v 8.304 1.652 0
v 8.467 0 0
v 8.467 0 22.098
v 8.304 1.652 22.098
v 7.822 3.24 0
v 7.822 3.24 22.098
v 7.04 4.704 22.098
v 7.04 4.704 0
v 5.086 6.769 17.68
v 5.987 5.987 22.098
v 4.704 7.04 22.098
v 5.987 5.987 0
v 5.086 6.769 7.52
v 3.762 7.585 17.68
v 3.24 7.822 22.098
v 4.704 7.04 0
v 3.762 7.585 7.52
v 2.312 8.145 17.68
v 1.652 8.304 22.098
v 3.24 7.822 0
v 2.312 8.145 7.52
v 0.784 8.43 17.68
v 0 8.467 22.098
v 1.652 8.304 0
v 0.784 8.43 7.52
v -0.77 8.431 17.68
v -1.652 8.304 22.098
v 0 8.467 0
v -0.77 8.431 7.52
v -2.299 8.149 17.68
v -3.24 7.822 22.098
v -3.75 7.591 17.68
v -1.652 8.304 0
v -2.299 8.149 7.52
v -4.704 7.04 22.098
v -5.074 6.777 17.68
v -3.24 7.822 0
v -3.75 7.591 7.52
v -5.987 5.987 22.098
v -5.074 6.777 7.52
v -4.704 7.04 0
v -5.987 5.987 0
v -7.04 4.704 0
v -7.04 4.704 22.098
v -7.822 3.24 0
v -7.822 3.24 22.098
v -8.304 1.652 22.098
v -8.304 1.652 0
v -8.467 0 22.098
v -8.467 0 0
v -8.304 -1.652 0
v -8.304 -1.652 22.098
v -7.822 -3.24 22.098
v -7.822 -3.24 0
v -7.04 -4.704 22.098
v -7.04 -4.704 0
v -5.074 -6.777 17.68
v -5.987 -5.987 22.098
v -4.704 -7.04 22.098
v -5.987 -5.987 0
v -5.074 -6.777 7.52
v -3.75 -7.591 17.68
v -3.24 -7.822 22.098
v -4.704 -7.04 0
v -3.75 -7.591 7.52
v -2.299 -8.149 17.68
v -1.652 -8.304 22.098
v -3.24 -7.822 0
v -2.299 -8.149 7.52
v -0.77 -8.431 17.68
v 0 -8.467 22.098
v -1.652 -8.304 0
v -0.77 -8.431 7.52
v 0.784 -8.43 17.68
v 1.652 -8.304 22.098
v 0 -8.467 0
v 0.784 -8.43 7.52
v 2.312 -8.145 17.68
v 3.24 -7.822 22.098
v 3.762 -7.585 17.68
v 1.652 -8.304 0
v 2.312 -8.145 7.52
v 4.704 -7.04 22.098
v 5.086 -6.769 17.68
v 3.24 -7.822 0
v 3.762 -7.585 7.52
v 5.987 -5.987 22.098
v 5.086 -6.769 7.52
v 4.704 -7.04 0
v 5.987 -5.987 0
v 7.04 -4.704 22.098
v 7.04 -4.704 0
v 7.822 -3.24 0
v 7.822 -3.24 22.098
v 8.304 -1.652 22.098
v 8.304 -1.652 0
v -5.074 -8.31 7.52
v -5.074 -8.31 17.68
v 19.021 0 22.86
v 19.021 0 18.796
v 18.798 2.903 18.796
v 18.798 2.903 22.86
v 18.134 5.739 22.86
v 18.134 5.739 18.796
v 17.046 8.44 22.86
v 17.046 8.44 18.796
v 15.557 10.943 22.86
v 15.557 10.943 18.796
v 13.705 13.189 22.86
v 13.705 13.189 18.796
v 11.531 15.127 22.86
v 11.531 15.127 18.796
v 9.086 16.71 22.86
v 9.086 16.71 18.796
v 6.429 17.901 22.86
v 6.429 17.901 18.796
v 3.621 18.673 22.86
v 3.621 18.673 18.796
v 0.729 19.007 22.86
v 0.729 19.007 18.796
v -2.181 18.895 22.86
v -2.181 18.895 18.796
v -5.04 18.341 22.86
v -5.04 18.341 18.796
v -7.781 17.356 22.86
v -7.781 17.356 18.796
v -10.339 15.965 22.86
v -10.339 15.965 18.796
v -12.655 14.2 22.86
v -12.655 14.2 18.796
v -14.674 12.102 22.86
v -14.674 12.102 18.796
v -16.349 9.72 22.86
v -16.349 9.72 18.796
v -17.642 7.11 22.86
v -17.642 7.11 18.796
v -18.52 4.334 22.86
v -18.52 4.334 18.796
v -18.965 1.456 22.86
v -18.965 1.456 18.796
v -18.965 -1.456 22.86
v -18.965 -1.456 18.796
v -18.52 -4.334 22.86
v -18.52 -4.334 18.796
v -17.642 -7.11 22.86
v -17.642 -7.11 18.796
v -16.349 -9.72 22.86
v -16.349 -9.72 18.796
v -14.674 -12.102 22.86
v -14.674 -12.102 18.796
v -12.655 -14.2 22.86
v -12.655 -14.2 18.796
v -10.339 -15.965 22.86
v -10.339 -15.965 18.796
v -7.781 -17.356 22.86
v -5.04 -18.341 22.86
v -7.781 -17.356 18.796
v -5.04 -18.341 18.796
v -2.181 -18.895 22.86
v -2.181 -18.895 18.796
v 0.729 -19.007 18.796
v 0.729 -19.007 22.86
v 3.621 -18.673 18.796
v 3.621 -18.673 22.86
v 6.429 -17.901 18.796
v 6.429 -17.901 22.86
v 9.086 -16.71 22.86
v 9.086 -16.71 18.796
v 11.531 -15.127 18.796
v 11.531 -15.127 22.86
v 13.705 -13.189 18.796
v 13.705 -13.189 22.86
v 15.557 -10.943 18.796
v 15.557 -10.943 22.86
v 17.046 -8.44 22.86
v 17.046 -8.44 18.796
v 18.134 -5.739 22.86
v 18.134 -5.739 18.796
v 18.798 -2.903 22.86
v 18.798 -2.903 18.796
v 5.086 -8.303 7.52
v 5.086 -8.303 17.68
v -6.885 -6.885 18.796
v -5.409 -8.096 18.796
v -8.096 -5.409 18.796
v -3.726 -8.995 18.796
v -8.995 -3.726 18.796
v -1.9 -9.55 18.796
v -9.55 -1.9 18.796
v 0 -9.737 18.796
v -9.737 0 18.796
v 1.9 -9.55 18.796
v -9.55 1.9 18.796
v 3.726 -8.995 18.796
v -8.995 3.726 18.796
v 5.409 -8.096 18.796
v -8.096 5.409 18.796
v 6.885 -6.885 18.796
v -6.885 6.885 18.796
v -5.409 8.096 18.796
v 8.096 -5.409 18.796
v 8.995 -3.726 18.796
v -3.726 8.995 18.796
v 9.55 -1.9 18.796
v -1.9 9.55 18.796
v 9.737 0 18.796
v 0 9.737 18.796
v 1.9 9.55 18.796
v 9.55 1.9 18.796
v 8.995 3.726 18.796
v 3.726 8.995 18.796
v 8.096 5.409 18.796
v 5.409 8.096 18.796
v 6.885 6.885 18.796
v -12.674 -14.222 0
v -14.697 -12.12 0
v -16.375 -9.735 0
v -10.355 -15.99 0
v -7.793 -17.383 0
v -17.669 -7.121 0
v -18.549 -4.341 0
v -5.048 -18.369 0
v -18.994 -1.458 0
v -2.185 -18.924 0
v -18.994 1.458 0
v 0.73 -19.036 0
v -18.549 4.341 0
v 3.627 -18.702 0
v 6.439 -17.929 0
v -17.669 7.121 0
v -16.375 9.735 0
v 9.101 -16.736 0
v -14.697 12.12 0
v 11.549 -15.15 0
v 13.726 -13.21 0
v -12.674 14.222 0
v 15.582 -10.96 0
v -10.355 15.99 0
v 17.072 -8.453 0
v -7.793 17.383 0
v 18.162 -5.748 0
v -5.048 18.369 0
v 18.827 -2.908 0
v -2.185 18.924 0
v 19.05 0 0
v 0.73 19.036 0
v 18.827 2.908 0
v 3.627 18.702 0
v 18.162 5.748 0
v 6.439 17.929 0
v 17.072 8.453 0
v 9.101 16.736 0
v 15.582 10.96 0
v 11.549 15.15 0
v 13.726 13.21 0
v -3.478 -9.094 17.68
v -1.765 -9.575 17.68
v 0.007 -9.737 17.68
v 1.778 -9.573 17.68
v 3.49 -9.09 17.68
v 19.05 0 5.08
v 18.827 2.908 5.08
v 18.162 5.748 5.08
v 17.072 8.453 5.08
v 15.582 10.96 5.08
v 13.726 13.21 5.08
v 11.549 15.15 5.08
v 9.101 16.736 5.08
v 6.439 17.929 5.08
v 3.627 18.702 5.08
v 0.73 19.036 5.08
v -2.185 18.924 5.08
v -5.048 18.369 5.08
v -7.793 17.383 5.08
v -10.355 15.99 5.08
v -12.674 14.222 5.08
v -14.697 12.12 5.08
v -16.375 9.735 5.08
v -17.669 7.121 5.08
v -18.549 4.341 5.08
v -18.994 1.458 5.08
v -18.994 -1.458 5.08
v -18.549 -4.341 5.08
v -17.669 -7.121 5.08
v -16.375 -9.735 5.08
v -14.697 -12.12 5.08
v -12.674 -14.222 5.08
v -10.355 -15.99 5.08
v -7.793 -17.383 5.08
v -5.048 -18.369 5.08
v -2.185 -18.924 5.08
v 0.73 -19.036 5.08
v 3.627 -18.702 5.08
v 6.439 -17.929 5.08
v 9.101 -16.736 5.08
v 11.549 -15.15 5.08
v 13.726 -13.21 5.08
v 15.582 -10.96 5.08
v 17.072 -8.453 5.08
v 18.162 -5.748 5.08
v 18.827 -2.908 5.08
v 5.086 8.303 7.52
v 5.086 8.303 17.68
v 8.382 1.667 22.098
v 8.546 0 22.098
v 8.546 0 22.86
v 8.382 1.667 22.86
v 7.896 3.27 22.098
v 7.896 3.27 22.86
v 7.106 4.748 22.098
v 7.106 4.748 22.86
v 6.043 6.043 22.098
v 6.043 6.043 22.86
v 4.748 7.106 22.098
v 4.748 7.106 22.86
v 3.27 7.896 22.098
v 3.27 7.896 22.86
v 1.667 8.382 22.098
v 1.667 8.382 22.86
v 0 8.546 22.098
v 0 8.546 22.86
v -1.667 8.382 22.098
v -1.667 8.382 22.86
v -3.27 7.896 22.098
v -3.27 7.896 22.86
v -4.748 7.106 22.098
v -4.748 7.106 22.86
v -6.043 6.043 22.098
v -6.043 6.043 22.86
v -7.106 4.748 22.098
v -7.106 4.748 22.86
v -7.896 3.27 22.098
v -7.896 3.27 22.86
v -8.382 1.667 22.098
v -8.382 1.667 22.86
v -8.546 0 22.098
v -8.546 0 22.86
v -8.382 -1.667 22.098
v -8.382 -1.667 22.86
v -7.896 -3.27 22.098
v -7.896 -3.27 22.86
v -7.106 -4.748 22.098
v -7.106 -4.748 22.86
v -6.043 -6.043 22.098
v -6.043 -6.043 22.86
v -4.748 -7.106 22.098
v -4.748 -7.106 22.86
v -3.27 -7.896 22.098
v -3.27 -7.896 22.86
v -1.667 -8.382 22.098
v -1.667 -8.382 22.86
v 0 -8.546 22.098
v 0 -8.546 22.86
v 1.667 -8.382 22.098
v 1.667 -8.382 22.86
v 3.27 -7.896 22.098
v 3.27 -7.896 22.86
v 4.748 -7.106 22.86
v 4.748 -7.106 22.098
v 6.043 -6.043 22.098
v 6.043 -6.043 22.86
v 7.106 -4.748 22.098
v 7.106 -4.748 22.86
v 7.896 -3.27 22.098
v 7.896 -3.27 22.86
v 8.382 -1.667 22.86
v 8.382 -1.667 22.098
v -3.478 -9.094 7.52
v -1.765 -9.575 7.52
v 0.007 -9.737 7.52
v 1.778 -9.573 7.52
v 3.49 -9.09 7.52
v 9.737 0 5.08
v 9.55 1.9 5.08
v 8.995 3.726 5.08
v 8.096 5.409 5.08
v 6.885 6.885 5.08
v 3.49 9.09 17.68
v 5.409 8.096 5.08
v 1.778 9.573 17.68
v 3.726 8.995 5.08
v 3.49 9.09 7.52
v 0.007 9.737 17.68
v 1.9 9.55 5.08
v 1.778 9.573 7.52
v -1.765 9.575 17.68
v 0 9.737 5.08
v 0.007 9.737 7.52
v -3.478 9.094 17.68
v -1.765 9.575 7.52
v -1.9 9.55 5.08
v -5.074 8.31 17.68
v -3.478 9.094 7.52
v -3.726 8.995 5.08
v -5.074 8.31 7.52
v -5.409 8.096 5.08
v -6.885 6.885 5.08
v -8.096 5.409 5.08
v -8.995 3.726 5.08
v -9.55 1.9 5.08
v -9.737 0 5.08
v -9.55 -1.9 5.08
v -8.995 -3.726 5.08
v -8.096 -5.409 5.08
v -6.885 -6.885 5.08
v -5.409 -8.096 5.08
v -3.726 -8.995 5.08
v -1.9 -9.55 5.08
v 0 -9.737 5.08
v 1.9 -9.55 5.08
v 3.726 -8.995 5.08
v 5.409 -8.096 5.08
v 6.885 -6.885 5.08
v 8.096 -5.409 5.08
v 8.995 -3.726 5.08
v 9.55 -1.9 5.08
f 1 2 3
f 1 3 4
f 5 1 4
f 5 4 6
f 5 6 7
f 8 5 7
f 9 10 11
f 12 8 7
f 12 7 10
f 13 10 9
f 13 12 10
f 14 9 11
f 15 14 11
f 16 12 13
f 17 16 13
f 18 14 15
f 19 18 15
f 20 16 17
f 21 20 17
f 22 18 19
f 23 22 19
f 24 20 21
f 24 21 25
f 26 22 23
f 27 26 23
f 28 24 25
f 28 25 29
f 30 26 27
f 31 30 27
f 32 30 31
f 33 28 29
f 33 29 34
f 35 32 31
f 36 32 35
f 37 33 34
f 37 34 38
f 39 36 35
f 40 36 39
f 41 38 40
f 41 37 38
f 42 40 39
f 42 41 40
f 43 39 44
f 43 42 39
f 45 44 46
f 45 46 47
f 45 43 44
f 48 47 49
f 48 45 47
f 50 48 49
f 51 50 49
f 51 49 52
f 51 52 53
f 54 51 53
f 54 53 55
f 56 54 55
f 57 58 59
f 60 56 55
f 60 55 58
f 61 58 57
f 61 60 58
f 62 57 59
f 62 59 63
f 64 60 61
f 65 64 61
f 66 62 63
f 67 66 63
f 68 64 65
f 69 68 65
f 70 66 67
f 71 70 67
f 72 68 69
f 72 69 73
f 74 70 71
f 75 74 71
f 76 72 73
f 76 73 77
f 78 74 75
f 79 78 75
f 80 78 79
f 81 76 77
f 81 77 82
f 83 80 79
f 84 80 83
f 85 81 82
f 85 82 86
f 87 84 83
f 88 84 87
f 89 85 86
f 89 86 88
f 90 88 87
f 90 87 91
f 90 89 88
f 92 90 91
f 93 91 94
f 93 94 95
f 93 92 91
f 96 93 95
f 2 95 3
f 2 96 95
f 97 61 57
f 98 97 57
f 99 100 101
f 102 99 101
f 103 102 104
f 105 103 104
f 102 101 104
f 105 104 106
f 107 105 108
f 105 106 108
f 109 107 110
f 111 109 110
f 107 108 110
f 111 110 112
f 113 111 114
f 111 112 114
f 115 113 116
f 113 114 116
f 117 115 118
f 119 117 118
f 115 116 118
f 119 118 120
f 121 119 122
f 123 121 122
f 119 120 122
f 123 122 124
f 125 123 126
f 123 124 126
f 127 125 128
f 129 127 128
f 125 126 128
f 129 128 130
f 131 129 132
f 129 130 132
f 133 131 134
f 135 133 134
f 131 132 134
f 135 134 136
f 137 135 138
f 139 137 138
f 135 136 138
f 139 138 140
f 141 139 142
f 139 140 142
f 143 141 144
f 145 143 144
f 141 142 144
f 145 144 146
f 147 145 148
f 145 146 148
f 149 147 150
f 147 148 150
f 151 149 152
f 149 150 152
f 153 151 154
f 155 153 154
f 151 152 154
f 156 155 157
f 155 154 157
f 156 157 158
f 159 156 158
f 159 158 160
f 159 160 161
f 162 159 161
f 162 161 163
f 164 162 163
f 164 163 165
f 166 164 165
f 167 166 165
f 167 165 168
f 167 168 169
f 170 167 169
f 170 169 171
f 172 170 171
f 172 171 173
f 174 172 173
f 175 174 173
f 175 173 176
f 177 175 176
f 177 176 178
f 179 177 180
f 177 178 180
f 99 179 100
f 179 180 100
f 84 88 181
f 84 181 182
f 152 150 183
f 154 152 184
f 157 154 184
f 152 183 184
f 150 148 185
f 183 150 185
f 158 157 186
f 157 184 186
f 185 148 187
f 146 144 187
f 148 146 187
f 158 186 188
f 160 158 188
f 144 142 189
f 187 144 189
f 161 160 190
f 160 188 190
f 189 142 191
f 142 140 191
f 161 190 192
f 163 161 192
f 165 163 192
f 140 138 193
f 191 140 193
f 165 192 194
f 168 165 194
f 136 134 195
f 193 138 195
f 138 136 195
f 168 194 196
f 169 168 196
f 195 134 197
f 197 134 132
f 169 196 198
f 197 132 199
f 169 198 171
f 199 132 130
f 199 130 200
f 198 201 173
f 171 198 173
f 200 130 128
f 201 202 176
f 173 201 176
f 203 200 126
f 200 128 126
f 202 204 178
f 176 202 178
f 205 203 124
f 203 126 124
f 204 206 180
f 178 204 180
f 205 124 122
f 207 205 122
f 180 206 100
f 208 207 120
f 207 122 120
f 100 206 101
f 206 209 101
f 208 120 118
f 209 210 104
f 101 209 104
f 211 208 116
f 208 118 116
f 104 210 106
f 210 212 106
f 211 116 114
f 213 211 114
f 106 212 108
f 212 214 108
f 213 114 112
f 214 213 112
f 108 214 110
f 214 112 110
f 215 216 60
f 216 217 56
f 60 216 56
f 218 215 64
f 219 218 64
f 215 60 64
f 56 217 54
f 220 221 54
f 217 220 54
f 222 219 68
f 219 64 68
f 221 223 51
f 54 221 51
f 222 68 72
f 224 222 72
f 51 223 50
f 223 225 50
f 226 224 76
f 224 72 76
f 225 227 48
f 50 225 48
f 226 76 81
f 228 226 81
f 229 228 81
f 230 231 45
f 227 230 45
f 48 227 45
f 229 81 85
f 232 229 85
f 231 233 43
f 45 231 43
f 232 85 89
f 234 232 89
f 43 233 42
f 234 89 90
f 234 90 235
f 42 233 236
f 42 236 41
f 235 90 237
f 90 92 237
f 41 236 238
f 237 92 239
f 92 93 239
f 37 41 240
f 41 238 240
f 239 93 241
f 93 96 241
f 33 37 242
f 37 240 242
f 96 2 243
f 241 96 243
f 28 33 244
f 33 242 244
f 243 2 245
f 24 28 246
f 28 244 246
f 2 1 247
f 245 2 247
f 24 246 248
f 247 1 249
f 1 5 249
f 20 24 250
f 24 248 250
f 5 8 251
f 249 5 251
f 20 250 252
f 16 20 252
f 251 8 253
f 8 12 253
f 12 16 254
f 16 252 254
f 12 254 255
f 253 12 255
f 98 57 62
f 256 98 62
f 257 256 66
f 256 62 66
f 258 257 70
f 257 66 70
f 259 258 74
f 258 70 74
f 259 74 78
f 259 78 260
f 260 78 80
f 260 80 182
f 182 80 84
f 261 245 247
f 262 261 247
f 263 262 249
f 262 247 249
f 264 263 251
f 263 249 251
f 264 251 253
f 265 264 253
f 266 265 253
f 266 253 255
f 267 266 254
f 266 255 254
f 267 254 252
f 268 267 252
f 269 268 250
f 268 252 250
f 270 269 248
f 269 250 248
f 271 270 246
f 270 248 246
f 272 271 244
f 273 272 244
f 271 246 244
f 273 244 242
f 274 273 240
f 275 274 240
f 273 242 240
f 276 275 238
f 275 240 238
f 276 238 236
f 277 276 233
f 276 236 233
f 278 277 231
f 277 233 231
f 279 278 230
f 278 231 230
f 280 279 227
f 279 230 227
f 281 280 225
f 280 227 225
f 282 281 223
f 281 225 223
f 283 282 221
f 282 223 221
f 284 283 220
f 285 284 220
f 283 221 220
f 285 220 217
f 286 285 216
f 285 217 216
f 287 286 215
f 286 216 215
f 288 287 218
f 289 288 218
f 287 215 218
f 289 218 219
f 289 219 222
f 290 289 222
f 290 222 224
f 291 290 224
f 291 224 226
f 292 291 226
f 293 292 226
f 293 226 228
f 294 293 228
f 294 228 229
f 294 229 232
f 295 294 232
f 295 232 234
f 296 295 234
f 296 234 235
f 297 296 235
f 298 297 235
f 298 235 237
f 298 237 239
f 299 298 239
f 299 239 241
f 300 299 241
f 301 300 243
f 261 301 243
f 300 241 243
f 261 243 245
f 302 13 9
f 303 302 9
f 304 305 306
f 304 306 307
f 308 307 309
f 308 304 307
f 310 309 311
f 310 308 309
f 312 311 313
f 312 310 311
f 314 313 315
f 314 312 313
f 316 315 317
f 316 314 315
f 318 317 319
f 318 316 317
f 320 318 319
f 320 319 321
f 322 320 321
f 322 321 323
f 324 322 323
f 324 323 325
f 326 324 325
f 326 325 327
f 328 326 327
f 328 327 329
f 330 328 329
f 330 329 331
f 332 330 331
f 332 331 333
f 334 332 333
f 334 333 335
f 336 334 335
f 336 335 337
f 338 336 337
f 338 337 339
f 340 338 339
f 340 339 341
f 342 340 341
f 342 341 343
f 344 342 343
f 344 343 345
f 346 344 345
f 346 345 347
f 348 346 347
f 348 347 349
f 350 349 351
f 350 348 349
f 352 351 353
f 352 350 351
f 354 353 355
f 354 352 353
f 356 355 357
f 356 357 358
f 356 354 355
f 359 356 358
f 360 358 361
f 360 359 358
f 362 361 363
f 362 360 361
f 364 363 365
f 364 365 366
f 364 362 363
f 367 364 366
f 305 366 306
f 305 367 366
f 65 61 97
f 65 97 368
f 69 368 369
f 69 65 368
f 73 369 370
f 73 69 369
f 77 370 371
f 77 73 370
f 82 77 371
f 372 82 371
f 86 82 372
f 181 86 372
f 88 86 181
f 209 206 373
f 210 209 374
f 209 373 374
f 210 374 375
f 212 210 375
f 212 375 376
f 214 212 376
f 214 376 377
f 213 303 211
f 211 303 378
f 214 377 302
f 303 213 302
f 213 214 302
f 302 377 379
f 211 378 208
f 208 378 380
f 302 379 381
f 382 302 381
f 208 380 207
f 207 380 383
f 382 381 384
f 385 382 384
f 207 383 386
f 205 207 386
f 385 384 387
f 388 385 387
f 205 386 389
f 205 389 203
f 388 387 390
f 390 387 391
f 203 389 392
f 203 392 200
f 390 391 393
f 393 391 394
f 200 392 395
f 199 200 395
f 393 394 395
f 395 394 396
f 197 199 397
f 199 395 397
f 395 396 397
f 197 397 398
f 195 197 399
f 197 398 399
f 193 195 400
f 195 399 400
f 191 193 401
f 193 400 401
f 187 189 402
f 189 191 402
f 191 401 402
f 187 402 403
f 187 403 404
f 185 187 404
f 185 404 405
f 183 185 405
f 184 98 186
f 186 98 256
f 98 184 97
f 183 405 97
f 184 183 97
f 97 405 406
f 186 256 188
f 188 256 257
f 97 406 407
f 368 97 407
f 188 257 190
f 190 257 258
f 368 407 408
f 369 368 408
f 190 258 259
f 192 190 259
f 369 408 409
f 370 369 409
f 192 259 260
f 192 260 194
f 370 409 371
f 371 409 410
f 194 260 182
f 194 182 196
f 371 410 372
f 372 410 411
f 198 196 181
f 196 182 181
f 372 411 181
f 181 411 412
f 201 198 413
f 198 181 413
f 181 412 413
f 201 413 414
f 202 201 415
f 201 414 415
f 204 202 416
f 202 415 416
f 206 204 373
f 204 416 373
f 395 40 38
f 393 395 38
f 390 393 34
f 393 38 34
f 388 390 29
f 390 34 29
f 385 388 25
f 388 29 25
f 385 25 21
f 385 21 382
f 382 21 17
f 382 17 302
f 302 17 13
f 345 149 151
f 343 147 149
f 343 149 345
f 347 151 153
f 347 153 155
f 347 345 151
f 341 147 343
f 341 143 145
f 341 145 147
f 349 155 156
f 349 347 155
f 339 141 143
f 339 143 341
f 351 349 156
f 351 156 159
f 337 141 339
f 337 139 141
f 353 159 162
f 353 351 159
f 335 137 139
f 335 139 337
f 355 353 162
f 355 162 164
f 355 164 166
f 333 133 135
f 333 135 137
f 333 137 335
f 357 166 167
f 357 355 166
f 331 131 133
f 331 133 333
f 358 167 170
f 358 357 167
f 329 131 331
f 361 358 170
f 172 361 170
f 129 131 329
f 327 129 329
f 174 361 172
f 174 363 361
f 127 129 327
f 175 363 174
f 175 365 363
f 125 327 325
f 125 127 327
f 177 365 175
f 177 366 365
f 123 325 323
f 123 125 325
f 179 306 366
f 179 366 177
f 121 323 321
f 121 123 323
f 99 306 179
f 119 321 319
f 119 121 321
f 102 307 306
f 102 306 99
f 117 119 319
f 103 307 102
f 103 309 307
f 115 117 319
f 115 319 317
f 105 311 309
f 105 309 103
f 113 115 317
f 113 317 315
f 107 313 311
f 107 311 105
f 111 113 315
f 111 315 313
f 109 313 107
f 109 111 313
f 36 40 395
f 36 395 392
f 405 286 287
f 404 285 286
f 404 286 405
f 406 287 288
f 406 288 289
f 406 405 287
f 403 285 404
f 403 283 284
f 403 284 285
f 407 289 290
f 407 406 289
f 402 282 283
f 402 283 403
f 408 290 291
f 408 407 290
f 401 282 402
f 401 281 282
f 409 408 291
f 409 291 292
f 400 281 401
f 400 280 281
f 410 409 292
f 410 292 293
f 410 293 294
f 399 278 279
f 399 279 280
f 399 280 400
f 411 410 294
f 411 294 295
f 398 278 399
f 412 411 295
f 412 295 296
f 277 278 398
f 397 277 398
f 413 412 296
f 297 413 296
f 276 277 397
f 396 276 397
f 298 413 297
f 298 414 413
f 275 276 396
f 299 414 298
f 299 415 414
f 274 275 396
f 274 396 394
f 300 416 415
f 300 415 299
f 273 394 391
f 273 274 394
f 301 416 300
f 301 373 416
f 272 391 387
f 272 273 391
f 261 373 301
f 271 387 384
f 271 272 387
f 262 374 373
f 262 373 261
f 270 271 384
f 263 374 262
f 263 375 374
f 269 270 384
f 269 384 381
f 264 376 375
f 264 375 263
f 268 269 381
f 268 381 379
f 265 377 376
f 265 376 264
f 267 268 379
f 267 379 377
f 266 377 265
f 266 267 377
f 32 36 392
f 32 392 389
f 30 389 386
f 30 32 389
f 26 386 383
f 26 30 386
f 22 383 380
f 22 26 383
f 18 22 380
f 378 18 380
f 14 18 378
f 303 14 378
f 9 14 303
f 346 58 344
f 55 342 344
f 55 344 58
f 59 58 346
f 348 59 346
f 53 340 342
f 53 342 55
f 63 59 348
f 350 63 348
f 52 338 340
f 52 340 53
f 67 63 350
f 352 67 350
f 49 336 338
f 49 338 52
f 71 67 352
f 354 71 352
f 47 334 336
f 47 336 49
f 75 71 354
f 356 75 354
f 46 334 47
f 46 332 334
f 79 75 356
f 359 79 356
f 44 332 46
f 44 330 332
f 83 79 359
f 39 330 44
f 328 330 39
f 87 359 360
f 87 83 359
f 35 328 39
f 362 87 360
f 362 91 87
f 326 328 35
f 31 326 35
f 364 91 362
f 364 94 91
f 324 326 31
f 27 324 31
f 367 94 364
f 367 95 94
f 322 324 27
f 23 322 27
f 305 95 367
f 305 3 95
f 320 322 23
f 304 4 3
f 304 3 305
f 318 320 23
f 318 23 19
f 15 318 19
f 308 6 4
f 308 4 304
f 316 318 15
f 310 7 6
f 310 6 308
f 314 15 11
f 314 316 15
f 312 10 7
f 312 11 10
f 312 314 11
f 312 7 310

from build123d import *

# Parameters (mm, degrees)
F0_R          = 19.05
F0_R_2        = 9.7365901145
F1_DEPTH      = 5.08
F0_R_3        = 8.4665901145
F2_DEPTH      = 22.098
F4_START      = 18.796
F3_R          = 19.0205211377
F3_R_2        = 8.5460755938
F4_DEPTH      = 4.064
F5_W          = 10.16
F5_H          = 10.16
F6_DEPTH      = 13.716
F6_DEPTH_BACK = 12.446


with BuildPart() as f1:
    # F0 (on Top) → F1 (new body)
    with BuildSketch(Plane.XY):
        Circle(F0_R)
        Circle(F0_R_2, mode=Mode.SUBTRACT)
    extrude(amount=F1_DEPTH)

    # F0 (on Top) → F2 (join)
    with BuildSketch(Plane.XY):
        Circle(F0_R_2)
        Circle(F0_R_3, mode=Mode.SUBTRACT)
    extrude(amount=F2_DEPTH)

    # F3 (on Top) → F4 (join)
    with BuildSketch(Plane.XY.offset(F4_START)):
        Circle(F3_R)
        Circle(F3_R_2, mode=Mode.SUBTRACT)
    extrude(amount=F4_DEPTH)

    # F5 (on Front) → F6 (cut, two sides)
    with BuildSketch(Plane.XZ) as f6_sk:
        with Locations((0.0056111868, 12.6004907916)):
            Rectangle(F5_W, F5_H)
    extrude(amount=-F6_DEPTH, mode=Mode.SUBTRACT)
    extrude(f6_sk.sketch, amount=F6_DEPTH_BACK, mode=Mode.SUBTRACT)


solid = f1.part
